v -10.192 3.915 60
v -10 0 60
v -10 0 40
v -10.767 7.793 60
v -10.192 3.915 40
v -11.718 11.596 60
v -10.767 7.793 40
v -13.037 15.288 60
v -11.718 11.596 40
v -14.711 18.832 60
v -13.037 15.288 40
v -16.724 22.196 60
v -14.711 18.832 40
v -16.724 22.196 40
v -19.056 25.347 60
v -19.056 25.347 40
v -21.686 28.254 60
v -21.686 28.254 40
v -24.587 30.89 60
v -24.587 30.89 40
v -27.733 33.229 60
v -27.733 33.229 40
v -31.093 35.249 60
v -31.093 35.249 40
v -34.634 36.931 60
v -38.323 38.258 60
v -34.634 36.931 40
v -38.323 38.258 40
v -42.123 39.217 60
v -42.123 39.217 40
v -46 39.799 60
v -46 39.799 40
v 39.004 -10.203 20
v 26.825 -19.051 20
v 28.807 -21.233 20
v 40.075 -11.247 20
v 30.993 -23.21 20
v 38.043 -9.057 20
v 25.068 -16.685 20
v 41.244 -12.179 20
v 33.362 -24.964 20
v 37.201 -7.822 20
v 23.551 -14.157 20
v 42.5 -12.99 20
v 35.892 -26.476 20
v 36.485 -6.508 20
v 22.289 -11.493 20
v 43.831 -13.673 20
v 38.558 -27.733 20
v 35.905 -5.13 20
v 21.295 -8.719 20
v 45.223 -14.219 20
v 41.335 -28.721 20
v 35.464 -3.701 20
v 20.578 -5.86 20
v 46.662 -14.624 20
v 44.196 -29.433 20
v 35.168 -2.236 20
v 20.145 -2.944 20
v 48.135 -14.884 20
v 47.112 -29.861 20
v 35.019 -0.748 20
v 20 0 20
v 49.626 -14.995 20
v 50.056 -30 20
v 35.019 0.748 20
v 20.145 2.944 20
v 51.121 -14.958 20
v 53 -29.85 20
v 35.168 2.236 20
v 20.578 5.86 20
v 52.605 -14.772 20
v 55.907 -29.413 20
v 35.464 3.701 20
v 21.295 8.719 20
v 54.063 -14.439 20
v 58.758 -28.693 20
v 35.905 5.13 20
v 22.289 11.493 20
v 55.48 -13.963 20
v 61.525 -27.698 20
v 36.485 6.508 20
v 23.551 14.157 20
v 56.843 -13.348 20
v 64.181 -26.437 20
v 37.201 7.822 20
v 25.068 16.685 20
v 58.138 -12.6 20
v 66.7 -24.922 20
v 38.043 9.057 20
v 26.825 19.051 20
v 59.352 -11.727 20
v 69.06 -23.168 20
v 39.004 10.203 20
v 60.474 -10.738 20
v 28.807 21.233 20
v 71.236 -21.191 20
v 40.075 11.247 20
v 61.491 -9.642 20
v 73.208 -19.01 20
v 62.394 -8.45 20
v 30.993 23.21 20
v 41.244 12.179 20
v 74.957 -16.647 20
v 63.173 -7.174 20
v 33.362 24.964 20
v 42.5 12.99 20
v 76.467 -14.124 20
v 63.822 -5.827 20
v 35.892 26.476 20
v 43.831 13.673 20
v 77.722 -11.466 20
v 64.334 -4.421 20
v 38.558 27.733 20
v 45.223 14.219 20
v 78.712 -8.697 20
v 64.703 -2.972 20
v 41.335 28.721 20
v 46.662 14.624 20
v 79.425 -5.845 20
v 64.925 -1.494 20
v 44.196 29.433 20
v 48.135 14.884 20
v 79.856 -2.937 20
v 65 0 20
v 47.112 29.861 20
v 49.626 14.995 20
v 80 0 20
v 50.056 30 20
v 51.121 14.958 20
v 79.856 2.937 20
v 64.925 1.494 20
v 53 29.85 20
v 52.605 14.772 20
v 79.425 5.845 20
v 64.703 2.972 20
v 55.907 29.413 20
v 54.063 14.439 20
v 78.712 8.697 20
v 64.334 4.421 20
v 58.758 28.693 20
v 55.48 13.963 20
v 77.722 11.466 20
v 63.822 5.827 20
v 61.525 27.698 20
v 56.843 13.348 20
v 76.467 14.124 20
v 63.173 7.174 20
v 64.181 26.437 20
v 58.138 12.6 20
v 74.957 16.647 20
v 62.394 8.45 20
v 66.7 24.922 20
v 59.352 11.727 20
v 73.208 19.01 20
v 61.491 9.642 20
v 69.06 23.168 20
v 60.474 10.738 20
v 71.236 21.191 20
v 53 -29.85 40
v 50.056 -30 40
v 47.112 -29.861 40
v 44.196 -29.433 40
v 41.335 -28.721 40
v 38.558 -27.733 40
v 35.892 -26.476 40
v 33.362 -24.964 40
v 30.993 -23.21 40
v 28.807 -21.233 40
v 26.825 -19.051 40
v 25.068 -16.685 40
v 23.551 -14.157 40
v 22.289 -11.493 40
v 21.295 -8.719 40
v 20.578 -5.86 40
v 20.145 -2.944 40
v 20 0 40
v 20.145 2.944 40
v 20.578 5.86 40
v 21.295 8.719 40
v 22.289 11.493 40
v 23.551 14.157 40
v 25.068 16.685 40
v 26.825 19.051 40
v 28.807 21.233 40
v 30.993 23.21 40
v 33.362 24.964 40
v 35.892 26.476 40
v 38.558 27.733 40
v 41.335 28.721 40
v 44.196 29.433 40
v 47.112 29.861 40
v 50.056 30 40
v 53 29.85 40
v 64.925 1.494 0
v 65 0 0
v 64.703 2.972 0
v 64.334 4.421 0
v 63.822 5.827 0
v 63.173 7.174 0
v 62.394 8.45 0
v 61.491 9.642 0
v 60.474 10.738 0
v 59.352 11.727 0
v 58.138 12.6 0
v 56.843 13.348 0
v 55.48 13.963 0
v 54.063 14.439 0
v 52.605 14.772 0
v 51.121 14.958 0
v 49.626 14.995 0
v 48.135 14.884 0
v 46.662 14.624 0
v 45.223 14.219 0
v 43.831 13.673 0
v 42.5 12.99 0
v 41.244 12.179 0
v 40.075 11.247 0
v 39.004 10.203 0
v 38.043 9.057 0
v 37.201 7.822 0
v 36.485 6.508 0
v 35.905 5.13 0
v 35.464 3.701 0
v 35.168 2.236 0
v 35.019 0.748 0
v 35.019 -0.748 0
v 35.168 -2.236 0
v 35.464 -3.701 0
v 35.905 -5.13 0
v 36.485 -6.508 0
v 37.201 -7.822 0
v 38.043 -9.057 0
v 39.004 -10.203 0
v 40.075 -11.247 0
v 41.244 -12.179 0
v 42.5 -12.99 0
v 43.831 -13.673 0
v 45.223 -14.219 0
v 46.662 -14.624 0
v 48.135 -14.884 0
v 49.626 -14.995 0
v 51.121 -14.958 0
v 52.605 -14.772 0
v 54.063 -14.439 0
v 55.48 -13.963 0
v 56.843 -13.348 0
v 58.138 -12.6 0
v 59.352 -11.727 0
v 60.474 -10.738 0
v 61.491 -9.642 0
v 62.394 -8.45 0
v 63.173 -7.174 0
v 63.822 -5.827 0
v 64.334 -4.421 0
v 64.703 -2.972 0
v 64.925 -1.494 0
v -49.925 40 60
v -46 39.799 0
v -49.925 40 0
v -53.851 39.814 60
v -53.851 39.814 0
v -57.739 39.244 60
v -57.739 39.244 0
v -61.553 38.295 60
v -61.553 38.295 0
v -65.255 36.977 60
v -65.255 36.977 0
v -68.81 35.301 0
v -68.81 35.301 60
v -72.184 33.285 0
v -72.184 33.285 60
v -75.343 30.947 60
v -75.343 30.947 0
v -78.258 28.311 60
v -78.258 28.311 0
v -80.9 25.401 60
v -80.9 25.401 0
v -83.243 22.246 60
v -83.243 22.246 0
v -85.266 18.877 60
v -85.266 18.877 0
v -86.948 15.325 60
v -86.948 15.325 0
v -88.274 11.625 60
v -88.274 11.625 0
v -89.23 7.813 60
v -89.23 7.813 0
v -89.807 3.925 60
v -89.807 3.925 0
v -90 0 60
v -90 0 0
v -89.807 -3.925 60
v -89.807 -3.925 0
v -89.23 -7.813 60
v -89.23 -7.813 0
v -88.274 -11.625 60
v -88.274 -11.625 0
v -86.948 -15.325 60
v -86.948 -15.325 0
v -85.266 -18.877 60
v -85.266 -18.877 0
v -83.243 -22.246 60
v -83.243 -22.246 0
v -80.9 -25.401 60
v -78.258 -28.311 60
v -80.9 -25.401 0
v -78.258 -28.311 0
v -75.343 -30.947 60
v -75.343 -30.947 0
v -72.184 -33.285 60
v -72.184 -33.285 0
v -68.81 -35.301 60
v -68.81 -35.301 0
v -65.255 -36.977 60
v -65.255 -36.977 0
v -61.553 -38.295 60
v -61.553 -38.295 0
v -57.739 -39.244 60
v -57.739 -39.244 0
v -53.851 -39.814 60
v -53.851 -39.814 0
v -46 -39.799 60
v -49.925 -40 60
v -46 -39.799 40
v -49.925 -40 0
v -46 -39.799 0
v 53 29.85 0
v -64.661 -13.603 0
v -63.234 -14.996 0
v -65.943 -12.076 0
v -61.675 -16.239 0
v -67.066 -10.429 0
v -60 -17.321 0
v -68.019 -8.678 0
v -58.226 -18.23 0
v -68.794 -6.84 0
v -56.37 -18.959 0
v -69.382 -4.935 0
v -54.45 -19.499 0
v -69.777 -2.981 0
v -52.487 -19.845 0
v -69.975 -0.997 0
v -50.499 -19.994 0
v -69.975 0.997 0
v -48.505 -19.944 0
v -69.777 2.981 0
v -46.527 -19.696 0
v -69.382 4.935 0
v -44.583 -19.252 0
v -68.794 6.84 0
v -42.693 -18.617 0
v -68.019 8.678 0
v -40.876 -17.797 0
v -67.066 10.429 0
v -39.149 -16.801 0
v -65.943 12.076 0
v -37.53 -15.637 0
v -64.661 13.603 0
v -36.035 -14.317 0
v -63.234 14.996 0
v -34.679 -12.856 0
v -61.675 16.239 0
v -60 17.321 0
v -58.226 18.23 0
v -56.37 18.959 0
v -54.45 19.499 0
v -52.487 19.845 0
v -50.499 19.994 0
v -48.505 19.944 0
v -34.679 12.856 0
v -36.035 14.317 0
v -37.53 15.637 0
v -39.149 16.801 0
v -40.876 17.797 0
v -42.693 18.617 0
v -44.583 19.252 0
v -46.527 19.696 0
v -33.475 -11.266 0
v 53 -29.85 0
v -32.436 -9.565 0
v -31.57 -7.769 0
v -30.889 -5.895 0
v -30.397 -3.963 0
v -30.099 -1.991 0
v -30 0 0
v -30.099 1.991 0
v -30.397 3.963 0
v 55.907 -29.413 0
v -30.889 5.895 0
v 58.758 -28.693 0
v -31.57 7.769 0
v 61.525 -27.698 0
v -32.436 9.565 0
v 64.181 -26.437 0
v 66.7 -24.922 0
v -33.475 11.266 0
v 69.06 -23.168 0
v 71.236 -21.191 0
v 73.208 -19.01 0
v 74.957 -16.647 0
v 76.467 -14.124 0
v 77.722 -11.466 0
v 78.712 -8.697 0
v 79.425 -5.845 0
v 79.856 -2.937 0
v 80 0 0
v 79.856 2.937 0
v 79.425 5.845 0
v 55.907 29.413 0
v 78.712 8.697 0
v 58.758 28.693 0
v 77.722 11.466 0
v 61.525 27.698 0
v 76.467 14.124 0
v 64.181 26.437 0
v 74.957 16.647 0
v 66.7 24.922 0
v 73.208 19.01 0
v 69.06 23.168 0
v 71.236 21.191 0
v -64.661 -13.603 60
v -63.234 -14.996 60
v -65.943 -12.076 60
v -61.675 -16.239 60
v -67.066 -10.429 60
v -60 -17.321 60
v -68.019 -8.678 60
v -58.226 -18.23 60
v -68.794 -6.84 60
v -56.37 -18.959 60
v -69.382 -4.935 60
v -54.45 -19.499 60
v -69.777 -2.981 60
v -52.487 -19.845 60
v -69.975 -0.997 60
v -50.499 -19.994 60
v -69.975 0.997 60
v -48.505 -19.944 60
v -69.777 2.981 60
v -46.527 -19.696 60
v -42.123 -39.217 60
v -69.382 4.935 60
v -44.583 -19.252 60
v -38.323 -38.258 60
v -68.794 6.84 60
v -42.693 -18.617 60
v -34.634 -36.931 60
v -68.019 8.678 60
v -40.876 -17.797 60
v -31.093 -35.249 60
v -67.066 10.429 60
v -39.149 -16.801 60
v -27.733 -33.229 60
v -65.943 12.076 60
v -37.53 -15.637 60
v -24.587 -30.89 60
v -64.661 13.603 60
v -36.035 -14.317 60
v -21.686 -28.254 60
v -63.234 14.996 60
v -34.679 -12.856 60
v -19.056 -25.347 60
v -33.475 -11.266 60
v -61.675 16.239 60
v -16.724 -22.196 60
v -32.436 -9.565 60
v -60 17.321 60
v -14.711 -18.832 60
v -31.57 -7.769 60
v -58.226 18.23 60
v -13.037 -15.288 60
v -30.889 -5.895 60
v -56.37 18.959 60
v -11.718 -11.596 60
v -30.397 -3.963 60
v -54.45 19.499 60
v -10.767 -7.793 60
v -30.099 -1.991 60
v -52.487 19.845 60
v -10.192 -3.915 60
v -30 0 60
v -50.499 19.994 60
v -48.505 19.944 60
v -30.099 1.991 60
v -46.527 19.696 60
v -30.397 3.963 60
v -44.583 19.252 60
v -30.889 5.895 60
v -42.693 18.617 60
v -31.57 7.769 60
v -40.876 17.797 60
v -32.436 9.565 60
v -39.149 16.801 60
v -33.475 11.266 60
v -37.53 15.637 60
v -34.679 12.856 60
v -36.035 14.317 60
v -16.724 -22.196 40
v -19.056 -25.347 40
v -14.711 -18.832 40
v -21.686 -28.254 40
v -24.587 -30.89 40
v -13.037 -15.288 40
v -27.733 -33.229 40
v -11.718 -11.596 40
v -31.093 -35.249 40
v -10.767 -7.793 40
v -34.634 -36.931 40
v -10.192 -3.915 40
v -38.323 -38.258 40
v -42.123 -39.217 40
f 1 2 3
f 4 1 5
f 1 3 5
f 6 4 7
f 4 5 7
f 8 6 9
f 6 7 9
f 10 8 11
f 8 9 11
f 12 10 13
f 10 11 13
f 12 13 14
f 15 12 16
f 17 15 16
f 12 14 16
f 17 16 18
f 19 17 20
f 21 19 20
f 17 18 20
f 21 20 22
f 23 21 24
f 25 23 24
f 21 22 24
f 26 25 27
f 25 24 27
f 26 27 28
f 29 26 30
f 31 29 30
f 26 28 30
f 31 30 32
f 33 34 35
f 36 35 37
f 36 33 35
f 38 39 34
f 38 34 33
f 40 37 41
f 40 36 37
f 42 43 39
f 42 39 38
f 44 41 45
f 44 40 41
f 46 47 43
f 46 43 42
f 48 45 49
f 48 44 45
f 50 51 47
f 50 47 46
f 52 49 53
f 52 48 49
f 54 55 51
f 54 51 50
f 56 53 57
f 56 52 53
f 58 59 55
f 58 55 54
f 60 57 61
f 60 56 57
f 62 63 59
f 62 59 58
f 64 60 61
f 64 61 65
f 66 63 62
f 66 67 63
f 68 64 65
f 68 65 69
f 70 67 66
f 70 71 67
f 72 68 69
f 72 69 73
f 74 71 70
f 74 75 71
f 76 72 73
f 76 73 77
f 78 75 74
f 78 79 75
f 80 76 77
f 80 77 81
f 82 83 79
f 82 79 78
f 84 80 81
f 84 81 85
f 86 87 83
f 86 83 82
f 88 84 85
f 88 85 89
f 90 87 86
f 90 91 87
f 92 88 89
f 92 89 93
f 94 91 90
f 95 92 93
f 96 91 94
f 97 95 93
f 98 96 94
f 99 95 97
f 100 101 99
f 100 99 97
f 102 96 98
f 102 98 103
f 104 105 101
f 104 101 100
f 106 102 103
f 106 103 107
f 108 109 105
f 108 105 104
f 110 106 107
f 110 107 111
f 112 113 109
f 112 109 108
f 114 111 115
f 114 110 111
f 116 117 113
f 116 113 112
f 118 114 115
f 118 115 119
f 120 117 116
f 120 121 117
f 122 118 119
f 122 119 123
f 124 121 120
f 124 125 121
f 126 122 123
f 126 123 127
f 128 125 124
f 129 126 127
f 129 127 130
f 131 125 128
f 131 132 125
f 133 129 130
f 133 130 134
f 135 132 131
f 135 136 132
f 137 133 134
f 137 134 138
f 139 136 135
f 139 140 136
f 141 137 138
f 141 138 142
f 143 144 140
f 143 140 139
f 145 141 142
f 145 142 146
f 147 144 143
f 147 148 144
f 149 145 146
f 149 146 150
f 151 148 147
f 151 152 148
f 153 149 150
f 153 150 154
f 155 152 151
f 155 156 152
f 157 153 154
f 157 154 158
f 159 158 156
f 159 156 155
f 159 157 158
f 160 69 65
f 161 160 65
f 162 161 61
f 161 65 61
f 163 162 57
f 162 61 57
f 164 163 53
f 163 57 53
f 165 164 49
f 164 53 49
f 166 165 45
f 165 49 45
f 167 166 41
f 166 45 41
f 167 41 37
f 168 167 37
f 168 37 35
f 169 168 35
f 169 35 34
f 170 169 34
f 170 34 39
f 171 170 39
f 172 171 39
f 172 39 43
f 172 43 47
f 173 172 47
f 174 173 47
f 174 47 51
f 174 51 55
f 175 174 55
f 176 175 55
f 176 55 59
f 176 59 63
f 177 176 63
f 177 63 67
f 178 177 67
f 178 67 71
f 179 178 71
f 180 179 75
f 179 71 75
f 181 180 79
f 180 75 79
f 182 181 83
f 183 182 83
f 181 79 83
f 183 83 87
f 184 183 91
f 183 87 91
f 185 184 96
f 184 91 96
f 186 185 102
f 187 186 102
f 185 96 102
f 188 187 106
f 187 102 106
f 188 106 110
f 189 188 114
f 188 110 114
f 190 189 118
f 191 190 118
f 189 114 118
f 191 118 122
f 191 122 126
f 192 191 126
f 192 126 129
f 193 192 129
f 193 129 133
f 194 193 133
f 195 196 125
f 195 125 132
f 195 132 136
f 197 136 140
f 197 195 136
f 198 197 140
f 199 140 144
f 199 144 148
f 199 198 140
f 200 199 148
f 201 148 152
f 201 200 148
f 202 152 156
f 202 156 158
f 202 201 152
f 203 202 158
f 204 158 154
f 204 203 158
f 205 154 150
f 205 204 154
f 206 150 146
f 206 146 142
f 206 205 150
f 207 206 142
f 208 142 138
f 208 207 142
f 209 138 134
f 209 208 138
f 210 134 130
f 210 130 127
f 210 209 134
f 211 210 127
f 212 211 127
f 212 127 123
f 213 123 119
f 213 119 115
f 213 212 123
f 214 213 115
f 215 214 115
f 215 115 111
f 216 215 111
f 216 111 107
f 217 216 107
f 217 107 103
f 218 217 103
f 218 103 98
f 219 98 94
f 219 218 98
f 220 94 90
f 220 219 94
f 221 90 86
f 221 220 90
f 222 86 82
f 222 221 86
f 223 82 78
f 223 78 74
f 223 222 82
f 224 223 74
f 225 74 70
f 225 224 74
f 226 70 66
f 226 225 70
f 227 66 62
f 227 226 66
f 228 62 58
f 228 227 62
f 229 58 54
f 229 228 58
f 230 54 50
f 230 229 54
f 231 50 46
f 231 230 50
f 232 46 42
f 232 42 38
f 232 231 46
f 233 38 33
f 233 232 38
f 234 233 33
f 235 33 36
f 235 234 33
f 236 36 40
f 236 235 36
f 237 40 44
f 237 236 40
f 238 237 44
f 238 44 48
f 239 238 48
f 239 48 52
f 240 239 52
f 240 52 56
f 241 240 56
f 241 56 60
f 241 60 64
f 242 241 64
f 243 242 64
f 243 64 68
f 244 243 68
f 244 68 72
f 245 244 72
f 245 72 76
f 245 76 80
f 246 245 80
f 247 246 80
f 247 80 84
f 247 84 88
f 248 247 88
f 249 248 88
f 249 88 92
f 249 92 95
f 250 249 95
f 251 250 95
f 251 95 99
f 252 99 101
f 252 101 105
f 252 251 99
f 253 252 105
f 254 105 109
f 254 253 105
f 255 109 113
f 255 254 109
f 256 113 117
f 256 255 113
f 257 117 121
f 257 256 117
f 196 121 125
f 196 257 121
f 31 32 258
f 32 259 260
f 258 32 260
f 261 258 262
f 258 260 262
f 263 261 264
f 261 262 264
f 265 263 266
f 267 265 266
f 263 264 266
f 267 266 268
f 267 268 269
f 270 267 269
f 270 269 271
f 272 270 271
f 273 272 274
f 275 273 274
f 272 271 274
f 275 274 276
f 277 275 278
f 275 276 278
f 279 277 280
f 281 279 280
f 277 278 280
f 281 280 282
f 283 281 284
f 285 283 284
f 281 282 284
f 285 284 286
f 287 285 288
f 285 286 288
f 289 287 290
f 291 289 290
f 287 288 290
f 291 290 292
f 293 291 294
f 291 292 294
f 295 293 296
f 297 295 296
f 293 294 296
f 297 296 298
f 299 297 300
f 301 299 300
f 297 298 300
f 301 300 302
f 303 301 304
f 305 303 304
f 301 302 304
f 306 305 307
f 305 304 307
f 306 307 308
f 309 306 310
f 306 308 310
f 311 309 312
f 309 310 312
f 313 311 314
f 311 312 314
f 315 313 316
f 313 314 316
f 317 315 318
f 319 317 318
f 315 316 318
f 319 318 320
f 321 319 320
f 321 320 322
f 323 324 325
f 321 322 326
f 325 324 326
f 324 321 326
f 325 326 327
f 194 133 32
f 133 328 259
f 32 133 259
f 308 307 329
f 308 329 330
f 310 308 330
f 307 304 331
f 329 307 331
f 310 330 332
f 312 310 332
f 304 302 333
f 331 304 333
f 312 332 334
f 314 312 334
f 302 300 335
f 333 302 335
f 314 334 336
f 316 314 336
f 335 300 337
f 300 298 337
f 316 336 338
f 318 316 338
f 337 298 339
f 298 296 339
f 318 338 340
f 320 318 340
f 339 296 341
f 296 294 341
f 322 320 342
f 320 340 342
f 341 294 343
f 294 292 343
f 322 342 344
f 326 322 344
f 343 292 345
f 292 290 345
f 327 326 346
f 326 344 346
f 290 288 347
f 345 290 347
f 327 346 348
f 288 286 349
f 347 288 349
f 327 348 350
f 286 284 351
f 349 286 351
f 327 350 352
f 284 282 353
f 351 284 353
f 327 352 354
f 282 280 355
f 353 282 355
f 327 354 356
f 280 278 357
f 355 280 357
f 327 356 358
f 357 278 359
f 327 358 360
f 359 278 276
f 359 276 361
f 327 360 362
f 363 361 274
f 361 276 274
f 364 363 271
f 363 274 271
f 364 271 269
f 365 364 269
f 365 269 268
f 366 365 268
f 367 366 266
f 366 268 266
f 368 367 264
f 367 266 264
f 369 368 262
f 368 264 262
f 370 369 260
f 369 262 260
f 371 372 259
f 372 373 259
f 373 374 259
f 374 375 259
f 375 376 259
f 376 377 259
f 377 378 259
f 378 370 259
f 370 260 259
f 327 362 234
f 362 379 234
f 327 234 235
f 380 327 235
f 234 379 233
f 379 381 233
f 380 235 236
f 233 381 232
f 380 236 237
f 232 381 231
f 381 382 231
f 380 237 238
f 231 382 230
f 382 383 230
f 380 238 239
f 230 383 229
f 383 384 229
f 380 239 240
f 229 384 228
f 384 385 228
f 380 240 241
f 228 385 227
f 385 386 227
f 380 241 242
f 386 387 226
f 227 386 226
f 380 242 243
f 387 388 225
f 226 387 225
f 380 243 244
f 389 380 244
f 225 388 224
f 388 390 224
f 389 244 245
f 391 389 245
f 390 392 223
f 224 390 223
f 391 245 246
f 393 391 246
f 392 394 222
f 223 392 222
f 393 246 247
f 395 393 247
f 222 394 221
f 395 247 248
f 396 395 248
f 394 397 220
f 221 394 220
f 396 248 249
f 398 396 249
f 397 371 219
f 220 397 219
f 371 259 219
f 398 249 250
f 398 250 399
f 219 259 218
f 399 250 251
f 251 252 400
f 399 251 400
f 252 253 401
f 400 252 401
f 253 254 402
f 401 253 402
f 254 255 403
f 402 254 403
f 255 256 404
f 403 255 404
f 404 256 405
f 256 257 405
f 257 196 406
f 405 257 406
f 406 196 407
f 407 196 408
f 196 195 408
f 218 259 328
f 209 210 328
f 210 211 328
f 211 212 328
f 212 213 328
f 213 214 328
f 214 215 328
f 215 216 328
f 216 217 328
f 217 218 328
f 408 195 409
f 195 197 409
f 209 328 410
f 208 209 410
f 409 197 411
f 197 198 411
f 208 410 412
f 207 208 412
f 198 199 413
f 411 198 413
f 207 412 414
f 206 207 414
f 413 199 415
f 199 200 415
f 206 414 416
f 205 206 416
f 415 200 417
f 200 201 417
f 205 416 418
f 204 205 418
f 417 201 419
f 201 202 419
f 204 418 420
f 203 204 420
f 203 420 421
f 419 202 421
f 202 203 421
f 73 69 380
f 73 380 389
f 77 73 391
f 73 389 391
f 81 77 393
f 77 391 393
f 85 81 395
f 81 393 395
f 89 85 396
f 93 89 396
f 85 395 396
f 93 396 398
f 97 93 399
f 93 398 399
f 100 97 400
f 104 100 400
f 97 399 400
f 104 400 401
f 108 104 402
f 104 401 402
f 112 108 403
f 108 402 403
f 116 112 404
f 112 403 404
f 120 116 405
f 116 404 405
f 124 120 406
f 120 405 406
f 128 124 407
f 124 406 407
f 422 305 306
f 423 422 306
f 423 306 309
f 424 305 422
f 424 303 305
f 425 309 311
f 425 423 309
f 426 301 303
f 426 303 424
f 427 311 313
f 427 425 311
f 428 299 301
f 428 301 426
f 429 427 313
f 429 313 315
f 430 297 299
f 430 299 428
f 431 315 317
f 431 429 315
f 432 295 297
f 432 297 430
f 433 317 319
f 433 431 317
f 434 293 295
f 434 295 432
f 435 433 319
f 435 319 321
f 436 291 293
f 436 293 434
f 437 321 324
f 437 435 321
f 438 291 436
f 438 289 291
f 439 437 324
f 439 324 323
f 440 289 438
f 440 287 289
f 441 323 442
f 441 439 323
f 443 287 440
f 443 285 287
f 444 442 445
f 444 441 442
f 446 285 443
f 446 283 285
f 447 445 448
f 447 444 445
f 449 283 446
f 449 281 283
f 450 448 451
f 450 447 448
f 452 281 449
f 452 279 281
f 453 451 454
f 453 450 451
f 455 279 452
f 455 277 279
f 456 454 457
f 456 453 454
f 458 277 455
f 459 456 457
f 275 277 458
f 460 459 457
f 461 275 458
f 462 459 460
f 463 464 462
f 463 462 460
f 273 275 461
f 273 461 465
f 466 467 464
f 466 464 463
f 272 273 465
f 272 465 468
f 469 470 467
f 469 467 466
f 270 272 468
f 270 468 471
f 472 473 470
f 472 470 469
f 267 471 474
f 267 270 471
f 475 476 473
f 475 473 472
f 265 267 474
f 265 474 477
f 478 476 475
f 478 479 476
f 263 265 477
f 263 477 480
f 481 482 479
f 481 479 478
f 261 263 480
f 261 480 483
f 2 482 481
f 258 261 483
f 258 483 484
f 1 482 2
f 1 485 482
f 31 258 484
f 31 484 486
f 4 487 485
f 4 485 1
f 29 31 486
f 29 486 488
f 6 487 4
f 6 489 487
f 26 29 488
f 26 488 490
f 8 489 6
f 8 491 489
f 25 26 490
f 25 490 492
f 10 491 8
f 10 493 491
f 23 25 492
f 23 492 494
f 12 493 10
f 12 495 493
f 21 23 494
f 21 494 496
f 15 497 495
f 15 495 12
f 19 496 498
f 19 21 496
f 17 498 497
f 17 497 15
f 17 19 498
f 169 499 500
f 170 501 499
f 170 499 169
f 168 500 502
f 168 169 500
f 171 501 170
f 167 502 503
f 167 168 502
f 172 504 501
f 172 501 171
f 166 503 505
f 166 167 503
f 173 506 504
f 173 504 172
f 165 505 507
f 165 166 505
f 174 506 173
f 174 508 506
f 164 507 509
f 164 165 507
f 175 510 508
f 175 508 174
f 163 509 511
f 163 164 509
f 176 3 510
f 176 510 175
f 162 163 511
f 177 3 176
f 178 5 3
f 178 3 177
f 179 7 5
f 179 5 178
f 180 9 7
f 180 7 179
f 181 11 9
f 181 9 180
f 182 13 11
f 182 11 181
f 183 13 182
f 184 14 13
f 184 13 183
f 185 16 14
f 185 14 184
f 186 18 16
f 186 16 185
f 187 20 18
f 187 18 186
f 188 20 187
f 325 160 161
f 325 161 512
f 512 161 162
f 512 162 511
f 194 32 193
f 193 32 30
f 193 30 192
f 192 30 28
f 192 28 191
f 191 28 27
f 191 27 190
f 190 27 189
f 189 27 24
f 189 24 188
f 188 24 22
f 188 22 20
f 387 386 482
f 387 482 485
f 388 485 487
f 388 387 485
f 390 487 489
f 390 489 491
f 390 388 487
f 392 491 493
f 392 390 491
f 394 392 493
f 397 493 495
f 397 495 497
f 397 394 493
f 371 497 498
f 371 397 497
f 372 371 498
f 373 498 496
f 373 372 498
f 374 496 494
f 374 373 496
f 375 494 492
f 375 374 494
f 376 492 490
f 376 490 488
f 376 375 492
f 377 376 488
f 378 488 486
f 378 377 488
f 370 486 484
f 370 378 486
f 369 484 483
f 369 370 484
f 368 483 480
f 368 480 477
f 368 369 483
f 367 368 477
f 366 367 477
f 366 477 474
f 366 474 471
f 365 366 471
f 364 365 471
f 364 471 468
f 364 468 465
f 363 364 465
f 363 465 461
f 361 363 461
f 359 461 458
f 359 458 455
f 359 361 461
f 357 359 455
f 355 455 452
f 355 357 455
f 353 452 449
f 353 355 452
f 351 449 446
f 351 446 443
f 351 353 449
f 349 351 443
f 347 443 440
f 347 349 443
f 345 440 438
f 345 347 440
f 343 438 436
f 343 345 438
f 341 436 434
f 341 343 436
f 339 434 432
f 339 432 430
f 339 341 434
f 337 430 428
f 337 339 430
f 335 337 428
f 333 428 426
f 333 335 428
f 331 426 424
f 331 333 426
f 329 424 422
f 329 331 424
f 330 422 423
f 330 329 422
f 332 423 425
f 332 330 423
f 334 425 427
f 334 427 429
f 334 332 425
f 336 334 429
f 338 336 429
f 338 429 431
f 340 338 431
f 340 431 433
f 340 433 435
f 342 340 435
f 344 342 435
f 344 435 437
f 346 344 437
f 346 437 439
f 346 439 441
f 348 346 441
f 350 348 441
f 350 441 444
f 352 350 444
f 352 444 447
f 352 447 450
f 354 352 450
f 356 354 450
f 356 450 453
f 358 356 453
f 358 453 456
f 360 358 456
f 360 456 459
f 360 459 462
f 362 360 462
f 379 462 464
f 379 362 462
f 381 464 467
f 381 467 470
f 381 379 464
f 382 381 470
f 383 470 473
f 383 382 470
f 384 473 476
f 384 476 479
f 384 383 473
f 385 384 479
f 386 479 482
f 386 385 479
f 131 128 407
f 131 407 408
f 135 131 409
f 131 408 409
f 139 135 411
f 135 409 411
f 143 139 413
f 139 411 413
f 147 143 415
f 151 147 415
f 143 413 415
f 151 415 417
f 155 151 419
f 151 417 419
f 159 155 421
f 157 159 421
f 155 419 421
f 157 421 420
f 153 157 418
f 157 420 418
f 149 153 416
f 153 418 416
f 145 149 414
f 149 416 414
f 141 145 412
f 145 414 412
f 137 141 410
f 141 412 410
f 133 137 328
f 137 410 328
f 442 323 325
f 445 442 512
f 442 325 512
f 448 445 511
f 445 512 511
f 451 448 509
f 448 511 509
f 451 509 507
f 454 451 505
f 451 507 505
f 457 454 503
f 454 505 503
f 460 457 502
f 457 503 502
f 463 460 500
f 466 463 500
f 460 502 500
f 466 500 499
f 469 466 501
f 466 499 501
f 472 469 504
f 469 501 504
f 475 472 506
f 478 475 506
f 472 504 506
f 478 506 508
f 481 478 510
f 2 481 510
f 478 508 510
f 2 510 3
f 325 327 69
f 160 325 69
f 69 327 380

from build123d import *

# Parameters (mm, degrees)
F0_R     = 20
F1_DEPTH = 60
F2_DEPTH = 40
F0_R_2   = 15
F3_DEPTH = 20


with BuildPart() as f1:
    # F0 (on Top) → F1 (new body)
    with BuildSketch(Plane.XY):
        with BuildLine():
            ThreePointArc((-46, -39.799497), (-20.335206, -26.832816), (-10, 0))
            ThreePointArc((-10, 0), (-20.335206, 26.832816), (-46, 39.799497))
            ThreePointArc((-46, 39.799497), (-90, 0), (-46, -39.799497))
        make_face()
        with Locations((-50, 0)):
            Circle(F0_R, mode=Mode.SUBTRACT)
    extrude(amount=F1_DEPTH)

    # F0 (on Top) → F2 (join)
    with BuildSketch(Plane.XY):
        with BuildLine():
            ThreePointArc((-46, 39.799497), (-20.335206, 26.832816), (-10, 0))
            ThreePointArc((-10, 0), (-20.335206, -26.832816), (-46, -39.799497))
            Line((-46, -39.799497), (53, -29.849623))
            ThreePointArc((53, -29.849623), (20, 0), (53, 29.849623))
            Line((53, 29.849623), (-46, 39.799497))
        make_face()
    extrude(amount=F2_DEPTH)

    # F0 (on Top) → F3 (join)
    with BuildSketch(Plane.XY):
        with BuildLine():
            ThreePointArc((80, 0), (72.248595, 20.124612), (53, 29.849623))
            ThreePointArc((53, 29.849623), (20, 0), (53, -29.849623))
            ThreePointArc((53, -29.849623), (72.248595, -20.124612), (80, 0))
        make_face()
        with Locations((50, 0)):
            Circle(F0_R_2, mode=Mode.SUBTRACT)
    extrude(amount=F3_DEPTH)


solid = f1.part
